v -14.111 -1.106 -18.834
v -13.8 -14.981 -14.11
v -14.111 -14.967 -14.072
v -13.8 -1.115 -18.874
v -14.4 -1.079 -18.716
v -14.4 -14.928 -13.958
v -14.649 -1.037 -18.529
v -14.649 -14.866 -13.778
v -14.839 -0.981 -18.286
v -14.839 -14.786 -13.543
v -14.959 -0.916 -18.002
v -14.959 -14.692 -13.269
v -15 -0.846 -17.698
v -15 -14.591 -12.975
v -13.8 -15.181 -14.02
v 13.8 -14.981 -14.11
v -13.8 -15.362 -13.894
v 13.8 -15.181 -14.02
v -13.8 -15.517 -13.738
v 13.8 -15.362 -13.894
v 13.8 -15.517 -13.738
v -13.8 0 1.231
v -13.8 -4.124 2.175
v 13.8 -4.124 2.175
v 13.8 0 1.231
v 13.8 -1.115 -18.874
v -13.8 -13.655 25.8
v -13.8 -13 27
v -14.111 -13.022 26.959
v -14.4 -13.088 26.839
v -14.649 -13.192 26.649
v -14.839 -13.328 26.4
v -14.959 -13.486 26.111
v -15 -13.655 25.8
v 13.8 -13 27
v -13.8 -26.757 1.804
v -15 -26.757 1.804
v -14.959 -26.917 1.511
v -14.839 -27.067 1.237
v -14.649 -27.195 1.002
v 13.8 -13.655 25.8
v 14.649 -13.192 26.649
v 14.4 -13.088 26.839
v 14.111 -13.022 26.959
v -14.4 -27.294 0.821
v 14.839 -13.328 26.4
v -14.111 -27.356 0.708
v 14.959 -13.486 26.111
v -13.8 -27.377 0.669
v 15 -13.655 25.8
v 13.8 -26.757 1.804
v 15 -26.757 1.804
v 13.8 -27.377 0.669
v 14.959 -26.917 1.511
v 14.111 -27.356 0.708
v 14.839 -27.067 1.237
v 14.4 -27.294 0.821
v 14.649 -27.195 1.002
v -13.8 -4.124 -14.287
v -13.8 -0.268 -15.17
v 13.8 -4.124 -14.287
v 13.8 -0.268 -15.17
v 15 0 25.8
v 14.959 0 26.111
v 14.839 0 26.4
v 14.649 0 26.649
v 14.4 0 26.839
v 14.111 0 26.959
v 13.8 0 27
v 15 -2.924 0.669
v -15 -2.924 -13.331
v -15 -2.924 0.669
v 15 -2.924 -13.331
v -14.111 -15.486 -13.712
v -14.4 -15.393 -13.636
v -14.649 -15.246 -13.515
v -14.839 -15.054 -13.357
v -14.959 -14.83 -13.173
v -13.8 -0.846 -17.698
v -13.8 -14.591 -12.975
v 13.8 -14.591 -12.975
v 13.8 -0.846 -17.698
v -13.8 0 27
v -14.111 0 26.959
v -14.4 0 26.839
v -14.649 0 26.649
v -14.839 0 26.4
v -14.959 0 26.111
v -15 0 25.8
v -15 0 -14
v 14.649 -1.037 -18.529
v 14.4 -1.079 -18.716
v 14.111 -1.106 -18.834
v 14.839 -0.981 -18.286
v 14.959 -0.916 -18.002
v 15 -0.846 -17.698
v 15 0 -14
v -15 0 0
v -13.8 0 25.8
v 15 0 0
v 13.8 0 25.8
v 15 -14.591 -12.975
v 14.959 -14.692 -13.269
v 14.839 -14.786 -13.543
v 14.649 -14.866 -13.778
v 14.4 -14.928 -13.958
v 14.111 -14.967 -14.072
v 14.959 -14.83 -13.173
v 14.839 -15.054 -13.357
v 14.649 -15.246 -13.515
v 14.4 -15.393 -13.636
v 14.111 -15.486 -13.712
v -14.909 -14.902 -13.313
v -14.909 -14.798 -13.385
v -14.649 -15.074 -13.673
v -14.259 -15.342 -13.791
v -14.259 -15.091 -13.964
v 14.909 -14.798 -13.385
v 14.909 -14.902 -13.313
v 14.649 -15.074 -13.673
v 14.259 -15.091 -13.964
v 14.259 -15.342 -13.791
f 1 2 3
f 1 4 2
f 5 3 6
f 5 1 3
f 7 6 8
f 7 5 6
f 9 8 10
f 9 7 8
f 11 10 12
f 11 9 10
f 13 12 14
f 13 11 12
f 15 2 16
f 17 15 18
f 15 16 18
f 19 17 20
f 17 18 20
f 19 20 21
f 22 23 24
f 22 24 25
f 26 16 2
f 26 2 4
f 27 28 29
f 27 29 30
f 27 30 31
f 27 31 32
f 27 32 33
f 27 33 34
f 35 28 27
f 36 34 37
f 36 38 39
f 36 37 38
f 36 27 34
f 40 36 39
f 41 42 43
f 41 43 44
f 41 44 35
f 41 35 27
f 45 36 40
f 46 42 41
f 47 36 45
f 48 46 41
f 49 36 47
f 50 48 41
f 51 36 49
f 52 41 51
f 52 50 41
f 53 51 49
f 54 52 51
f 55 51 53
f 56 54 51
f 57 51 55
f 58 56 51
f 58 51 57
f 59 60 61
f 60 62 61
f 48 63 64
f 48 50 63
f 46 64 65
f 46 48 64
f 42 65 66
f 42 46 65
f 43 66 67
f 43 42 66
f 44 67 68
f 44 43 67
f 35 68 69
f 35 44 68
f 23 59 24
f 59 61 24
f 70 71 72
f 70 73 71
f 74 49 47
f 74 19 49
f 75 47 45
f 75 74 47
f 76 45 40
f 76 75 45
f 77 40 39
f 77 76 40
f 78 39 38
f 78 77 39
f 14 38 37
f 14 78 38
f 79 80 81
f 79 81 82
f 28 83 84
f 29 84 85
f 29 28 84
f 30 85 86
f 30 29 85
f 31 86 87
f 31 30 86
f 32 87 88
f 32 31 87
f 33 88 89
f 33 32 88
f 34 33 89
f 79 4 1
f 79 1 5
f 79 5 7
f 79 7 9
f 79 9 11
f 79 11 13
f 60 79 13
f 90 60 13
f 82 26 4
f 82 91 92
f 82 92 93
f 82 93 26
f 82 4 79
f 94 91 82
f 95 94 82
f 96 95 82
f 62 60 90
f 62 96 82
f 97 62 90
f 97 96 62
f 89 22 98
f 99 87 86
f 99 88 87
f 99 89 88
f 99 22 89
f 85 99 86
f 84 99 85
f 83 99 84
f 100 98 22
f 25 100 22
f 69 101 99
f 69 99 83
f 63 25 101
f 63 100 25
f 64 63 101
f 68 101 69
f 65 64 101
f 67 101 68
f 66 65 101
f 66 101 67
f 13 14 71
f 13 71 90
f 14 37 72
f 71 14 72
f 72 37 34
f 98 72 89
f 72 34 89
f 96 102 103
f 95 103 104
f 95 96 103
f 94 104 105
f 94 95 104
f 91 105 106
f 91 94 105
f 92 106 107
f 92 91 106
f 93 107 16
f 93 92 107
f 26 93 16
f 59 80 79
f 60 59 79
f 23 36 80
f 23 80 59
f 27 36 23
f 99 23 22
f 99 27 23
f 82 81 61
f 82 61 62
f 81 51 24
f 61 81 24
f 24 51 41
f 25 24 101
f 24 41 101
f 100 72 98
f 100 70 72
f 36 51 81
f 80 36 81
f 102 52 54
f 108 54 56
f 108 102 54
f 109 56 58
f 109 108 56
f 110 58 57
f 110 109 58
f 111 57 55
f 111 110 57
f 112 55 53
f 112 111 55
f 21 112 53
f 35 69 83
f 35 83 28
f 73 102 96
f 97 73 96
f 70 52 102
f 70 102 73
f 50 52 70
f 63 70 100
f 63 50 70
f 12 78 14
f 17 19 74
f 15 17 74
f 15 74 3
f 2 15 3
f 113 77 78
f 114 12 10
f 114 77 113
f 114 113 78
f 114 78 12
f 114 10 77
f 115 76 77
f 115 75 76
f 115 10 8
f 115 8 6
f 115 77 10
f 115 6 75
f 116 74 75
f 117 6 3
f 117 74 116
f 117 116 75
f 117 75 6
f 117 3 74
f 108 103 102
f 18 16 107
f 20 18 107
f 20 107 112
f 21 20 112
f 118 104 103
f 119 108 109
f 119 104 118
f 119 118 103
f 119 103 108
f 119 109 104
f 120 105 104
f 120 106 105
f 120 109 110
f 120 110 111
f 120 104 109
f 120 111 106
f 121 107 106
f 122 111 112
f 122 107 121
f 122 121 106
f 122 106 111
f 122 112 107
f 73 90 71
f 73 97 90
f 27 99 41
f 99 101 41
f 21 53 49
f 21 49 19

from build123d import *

# Parameters (mm, degrees)
F1_DEPTH = 15
F2_T     = -1.2
F3_R     = 1.2


with BuildPart() as f1:
    # F0 (on Right) → F1 (new body, symmetric)
    with BuildSketch(Plane.YZ):
        Polygon((-2.9243966283, 0.669256573), (0, 0), (0, 27), (-13, 27), (-27.3767851269, 0.669256573), (-15.3014834083, -14), (-1.1154276217, -18.8739943805), (0, -14), (-2.9243966283, -13.330743427), align=None)
    extrude(amount=F1_DEPTH, both=True)

    # F2
    f2_openings = [f1.faces().sort_by_distance(p)[0] for p in [
        (0, 0, 13.5),
        (0, -0.557714, -16.436997),
        (0, -20.188393, 13.834628),
    ]]
    offset(amount=F2_T, openings=f2_openings, kind=Kind.INTERSECTION)

    # F3
    f3_edges = [f1.edges().sort_by_distance(p)[0] for p in [
        (-15, -6.5, 27),
        (15, -6.5, 27),
        (-15, -8.208456, -16.436997),
        (0, -15.301483, -14),
        (-15, -21.339134, -6.665372),
        (15, -8.208456, -16.436997),
        (15, -21.339134, -6.665372),
    ]]
    fillet(f3_edges, radius=F3_R)


solid = f1.part
